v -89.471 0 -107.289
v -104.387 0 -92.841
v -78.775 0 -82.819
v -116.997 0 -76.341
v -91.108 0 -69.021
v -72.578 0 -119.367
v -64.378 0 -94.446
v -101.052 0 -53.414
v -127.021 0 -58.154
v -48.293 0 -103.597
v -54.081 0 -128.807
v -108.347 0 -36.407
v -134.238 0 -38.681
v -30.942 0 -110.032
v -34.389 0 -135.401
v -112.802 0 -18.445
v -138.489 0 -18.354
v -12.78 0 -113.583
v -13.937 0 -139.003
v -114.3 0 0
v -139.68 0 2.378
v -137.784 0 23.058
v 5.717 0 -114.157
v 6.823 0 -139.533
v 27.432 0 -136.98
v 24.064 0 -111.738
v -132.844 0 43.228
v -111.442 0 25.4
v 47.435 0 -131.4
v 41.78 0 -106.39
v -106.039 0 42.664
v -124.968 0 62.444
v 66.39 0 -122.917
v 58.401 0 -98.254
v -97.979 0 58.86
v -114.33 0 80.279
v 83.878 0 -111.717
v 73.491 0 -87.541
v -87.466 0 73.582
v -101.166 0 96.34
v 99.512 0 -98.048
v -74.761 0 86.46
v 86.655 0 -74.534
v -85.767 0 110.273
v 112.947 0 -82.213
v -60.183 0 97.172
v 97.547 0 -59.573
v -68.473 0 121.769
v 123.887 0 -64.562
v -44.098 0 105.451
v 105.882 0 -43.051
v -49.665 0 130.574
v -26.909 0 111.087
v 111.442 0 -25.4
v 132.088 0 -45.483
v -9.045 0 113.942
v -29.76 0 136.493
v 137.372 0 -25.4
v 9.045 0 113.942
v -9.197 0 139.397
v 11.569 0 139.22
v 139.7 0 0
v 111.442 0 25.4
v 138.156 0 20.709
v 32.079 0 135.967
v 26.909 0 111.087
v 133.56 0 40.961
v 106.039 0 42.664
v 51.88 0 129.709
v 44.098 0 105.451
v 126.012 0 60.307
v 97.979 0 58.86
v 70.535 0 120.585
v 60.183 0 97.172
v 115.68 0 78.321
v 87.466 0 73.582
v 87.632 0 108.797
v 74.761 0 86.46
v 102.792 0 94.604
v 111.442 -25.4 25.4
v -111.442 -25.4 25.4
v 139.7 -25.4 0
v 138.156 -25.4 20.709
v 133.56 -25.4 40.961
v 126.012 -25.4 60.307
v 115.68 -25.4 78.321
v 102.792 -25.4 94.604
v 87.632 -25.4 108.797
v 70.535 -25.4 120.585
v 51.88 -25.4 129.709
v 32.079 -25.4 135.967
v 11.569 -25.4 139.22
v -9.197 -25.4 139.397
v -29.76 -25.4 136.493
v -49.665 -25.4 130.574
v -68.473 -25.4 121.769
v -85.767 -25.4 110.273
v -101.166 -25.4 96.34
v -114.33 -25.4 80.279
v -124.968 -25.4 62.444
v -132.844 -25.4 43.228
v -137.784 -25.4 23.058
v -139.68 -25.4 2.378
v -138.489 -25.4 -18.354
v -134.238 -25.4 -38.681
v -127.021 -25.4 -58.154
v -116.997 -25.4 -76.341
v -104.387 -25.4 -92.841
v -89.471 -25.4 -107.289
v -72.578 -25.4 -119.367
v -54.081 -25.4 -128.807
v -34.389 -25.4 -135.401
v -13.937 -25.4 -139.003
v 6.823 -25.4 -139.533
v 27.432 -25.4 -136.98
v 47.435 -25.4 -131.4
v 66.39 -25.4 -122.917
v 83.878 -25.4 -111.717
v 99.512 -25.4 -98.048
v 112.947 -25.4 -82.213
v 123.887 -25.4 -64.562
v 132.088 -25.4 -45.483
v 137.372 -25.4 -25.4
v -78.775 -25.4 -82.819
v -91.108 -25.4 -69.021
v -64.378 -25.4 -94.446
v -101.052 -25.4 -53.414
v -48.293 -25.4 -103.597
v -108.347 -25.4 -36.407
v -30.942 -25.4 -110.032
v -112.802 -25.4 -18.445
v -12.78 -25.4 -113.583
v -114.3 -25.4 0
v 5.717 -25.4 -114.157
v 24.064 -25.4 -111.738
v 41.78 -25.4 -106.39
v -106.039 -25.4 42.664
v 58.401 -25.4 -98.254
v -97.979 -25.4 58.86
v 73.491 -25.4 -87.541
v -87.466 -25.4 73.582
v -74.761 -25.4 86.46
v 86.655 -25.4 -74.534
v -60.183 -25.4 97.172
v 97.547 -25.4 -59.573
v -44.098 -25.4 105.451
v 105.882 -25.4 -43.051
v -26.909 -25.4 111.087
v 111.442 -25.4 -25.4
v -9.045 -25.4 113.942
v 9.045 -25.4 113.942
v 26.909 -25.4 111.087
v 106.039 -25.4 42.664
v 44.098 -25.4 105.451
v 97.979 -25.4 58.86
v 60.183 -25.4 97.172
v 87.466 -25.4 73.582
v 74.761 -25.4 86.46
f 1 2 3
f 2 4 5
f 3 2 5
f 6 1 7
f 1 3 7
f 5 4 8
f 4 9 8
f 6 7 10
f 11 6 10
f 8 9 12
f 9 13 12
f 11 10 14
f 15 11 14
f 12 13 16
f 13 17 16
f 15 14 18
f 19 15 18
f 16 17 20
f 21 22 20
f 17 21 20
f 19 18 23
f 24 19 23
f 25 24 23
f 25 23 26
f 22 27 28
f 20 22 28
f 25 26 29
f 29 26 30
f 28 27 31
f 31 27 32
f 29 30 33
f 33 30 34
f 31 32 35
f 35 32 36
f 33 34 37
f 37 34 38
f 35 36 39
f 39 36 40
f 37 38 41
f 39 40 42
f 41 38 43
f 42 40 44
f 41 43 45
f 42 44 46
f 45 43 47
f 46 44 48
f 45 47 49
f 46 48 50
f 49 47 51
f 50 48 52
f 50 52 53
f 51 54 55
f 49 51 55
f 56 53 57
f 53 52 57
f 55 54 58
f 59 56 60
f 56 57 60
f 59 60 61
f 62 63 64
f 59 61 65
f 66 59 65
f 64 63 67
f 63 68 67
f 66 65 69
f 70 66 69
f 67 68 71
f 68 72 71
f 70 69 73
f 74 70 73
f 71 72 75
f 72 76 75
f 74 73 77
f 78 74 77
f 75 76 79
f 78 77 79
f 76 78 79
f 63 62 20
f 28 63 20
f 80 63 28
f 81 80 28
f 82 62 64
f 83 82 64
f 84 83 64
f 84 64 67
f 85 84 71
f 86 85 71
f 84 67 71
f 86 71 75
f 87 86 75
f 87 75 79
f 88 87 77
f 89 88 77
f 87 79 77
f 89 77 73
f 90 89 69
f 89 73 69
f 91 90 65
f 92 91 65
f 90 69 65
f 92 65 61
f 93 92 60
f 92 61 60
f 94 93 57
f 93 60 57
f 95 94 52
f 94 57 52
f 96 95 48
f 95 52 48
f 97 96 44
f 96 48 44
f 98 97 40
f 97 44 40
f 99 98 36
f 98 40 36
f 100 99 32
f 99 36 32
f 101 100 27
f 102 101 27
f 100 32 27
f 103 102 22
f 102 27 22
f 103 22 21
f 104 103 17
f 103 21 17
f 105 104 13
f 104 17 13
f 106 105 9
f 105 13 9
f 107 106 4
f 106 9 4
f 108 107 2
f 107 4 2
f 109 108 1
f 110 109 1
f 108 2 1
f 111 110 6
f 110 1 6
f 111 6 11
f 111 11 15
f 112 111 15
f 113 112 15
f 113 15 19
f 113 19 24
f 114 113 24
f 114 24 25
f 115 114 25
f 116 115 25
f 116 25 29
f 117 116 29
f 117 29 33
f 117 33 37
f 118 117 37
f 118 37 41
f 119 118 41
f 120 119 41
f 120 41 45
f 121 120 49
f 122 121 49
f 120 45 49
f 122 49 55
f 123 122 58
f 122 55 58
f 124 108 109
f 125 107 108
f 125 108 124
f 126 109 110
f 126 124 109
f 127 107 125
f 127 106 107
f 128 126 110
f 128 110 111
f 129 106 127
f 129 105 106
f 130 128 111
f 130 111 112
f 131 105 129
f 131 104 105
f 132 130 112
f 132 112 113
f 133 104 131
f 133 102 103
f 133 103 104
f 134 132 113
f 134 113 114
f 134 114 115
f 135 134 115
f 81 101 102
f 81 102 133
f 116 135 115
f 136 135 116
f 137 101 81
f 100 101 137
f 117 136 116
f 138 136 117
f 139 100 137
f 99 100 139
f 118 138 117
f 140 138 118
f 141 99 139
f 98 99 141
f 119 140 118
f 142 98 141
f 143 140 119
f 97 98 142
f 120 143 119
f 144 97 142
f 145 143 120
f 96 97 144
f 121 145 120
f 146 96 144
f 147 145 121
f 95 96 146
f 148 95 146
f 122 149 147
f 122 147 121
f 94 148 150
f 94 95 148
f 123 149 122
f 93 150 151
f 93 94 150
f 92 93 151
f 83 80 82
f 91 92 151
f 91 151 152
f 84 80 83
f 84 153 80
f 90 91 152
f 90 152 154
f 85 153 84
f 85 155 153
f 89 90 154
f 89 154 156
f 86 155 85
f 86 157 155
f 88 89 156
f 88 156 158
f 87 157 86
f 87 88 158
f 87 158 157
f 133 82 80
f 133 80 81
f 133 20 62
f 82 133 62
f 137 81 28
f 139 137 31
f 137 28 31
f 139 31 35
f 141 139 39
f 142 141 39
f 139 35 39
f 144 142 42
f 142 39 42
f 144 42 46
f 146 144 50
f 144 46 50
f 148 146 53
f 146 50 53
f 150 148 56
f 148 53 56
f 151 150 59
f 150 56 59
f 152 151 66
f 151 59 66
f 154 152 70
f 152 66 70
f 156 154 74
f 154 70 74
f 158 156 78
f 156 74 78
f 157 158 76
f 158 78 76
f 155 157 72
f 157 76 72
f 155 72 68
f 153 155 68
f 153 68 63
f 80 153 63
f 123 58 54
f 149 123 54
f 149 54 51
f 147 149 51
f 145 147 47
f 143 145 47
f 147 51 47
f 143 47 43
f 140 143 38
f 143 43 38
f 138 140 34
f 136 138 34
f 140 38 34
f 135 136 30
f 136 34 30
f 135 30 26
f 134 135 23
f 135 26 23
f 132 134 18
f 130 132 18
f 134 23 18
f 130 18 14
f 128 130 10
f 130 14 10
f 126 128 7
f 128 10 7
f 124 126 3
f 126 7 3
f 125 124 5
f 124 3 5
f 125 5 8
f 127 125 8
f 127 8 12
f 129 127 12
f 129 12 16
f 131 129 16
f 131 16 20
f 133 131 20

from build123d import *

# Parameters (mm, degrees)
F1_DEPTH = 25.4


with BuildPart() as f1:
    # F0 (on Front) → F1 (new body)
    with BuildSketch(Plane.XZ):
        with BuildLine():
            Line((-114.3, 0), (139.7, 0))
            ThreePointArc((139.7, 0), (-139.116658, 12.753253), (137.371504, -25.4))
            Line((137.371504, -25.4), (111.442048, -25.4))
            ThreePointArc((111.442048, -25.4), (-12.78014, -113.583265), (-114.3, 0))
        make_face()
        with BuildLine():
            ThreePointArc((-111.442048, 25.4), (0, 114.3), (111.442048, 25.4))
            Line((111.442048, 25.4), (-111.442048, 25.4))
        make_face(mode=Mode.SUBTRACT)
    extrude(amount=F1_DEPTH)


solid = f1.part
